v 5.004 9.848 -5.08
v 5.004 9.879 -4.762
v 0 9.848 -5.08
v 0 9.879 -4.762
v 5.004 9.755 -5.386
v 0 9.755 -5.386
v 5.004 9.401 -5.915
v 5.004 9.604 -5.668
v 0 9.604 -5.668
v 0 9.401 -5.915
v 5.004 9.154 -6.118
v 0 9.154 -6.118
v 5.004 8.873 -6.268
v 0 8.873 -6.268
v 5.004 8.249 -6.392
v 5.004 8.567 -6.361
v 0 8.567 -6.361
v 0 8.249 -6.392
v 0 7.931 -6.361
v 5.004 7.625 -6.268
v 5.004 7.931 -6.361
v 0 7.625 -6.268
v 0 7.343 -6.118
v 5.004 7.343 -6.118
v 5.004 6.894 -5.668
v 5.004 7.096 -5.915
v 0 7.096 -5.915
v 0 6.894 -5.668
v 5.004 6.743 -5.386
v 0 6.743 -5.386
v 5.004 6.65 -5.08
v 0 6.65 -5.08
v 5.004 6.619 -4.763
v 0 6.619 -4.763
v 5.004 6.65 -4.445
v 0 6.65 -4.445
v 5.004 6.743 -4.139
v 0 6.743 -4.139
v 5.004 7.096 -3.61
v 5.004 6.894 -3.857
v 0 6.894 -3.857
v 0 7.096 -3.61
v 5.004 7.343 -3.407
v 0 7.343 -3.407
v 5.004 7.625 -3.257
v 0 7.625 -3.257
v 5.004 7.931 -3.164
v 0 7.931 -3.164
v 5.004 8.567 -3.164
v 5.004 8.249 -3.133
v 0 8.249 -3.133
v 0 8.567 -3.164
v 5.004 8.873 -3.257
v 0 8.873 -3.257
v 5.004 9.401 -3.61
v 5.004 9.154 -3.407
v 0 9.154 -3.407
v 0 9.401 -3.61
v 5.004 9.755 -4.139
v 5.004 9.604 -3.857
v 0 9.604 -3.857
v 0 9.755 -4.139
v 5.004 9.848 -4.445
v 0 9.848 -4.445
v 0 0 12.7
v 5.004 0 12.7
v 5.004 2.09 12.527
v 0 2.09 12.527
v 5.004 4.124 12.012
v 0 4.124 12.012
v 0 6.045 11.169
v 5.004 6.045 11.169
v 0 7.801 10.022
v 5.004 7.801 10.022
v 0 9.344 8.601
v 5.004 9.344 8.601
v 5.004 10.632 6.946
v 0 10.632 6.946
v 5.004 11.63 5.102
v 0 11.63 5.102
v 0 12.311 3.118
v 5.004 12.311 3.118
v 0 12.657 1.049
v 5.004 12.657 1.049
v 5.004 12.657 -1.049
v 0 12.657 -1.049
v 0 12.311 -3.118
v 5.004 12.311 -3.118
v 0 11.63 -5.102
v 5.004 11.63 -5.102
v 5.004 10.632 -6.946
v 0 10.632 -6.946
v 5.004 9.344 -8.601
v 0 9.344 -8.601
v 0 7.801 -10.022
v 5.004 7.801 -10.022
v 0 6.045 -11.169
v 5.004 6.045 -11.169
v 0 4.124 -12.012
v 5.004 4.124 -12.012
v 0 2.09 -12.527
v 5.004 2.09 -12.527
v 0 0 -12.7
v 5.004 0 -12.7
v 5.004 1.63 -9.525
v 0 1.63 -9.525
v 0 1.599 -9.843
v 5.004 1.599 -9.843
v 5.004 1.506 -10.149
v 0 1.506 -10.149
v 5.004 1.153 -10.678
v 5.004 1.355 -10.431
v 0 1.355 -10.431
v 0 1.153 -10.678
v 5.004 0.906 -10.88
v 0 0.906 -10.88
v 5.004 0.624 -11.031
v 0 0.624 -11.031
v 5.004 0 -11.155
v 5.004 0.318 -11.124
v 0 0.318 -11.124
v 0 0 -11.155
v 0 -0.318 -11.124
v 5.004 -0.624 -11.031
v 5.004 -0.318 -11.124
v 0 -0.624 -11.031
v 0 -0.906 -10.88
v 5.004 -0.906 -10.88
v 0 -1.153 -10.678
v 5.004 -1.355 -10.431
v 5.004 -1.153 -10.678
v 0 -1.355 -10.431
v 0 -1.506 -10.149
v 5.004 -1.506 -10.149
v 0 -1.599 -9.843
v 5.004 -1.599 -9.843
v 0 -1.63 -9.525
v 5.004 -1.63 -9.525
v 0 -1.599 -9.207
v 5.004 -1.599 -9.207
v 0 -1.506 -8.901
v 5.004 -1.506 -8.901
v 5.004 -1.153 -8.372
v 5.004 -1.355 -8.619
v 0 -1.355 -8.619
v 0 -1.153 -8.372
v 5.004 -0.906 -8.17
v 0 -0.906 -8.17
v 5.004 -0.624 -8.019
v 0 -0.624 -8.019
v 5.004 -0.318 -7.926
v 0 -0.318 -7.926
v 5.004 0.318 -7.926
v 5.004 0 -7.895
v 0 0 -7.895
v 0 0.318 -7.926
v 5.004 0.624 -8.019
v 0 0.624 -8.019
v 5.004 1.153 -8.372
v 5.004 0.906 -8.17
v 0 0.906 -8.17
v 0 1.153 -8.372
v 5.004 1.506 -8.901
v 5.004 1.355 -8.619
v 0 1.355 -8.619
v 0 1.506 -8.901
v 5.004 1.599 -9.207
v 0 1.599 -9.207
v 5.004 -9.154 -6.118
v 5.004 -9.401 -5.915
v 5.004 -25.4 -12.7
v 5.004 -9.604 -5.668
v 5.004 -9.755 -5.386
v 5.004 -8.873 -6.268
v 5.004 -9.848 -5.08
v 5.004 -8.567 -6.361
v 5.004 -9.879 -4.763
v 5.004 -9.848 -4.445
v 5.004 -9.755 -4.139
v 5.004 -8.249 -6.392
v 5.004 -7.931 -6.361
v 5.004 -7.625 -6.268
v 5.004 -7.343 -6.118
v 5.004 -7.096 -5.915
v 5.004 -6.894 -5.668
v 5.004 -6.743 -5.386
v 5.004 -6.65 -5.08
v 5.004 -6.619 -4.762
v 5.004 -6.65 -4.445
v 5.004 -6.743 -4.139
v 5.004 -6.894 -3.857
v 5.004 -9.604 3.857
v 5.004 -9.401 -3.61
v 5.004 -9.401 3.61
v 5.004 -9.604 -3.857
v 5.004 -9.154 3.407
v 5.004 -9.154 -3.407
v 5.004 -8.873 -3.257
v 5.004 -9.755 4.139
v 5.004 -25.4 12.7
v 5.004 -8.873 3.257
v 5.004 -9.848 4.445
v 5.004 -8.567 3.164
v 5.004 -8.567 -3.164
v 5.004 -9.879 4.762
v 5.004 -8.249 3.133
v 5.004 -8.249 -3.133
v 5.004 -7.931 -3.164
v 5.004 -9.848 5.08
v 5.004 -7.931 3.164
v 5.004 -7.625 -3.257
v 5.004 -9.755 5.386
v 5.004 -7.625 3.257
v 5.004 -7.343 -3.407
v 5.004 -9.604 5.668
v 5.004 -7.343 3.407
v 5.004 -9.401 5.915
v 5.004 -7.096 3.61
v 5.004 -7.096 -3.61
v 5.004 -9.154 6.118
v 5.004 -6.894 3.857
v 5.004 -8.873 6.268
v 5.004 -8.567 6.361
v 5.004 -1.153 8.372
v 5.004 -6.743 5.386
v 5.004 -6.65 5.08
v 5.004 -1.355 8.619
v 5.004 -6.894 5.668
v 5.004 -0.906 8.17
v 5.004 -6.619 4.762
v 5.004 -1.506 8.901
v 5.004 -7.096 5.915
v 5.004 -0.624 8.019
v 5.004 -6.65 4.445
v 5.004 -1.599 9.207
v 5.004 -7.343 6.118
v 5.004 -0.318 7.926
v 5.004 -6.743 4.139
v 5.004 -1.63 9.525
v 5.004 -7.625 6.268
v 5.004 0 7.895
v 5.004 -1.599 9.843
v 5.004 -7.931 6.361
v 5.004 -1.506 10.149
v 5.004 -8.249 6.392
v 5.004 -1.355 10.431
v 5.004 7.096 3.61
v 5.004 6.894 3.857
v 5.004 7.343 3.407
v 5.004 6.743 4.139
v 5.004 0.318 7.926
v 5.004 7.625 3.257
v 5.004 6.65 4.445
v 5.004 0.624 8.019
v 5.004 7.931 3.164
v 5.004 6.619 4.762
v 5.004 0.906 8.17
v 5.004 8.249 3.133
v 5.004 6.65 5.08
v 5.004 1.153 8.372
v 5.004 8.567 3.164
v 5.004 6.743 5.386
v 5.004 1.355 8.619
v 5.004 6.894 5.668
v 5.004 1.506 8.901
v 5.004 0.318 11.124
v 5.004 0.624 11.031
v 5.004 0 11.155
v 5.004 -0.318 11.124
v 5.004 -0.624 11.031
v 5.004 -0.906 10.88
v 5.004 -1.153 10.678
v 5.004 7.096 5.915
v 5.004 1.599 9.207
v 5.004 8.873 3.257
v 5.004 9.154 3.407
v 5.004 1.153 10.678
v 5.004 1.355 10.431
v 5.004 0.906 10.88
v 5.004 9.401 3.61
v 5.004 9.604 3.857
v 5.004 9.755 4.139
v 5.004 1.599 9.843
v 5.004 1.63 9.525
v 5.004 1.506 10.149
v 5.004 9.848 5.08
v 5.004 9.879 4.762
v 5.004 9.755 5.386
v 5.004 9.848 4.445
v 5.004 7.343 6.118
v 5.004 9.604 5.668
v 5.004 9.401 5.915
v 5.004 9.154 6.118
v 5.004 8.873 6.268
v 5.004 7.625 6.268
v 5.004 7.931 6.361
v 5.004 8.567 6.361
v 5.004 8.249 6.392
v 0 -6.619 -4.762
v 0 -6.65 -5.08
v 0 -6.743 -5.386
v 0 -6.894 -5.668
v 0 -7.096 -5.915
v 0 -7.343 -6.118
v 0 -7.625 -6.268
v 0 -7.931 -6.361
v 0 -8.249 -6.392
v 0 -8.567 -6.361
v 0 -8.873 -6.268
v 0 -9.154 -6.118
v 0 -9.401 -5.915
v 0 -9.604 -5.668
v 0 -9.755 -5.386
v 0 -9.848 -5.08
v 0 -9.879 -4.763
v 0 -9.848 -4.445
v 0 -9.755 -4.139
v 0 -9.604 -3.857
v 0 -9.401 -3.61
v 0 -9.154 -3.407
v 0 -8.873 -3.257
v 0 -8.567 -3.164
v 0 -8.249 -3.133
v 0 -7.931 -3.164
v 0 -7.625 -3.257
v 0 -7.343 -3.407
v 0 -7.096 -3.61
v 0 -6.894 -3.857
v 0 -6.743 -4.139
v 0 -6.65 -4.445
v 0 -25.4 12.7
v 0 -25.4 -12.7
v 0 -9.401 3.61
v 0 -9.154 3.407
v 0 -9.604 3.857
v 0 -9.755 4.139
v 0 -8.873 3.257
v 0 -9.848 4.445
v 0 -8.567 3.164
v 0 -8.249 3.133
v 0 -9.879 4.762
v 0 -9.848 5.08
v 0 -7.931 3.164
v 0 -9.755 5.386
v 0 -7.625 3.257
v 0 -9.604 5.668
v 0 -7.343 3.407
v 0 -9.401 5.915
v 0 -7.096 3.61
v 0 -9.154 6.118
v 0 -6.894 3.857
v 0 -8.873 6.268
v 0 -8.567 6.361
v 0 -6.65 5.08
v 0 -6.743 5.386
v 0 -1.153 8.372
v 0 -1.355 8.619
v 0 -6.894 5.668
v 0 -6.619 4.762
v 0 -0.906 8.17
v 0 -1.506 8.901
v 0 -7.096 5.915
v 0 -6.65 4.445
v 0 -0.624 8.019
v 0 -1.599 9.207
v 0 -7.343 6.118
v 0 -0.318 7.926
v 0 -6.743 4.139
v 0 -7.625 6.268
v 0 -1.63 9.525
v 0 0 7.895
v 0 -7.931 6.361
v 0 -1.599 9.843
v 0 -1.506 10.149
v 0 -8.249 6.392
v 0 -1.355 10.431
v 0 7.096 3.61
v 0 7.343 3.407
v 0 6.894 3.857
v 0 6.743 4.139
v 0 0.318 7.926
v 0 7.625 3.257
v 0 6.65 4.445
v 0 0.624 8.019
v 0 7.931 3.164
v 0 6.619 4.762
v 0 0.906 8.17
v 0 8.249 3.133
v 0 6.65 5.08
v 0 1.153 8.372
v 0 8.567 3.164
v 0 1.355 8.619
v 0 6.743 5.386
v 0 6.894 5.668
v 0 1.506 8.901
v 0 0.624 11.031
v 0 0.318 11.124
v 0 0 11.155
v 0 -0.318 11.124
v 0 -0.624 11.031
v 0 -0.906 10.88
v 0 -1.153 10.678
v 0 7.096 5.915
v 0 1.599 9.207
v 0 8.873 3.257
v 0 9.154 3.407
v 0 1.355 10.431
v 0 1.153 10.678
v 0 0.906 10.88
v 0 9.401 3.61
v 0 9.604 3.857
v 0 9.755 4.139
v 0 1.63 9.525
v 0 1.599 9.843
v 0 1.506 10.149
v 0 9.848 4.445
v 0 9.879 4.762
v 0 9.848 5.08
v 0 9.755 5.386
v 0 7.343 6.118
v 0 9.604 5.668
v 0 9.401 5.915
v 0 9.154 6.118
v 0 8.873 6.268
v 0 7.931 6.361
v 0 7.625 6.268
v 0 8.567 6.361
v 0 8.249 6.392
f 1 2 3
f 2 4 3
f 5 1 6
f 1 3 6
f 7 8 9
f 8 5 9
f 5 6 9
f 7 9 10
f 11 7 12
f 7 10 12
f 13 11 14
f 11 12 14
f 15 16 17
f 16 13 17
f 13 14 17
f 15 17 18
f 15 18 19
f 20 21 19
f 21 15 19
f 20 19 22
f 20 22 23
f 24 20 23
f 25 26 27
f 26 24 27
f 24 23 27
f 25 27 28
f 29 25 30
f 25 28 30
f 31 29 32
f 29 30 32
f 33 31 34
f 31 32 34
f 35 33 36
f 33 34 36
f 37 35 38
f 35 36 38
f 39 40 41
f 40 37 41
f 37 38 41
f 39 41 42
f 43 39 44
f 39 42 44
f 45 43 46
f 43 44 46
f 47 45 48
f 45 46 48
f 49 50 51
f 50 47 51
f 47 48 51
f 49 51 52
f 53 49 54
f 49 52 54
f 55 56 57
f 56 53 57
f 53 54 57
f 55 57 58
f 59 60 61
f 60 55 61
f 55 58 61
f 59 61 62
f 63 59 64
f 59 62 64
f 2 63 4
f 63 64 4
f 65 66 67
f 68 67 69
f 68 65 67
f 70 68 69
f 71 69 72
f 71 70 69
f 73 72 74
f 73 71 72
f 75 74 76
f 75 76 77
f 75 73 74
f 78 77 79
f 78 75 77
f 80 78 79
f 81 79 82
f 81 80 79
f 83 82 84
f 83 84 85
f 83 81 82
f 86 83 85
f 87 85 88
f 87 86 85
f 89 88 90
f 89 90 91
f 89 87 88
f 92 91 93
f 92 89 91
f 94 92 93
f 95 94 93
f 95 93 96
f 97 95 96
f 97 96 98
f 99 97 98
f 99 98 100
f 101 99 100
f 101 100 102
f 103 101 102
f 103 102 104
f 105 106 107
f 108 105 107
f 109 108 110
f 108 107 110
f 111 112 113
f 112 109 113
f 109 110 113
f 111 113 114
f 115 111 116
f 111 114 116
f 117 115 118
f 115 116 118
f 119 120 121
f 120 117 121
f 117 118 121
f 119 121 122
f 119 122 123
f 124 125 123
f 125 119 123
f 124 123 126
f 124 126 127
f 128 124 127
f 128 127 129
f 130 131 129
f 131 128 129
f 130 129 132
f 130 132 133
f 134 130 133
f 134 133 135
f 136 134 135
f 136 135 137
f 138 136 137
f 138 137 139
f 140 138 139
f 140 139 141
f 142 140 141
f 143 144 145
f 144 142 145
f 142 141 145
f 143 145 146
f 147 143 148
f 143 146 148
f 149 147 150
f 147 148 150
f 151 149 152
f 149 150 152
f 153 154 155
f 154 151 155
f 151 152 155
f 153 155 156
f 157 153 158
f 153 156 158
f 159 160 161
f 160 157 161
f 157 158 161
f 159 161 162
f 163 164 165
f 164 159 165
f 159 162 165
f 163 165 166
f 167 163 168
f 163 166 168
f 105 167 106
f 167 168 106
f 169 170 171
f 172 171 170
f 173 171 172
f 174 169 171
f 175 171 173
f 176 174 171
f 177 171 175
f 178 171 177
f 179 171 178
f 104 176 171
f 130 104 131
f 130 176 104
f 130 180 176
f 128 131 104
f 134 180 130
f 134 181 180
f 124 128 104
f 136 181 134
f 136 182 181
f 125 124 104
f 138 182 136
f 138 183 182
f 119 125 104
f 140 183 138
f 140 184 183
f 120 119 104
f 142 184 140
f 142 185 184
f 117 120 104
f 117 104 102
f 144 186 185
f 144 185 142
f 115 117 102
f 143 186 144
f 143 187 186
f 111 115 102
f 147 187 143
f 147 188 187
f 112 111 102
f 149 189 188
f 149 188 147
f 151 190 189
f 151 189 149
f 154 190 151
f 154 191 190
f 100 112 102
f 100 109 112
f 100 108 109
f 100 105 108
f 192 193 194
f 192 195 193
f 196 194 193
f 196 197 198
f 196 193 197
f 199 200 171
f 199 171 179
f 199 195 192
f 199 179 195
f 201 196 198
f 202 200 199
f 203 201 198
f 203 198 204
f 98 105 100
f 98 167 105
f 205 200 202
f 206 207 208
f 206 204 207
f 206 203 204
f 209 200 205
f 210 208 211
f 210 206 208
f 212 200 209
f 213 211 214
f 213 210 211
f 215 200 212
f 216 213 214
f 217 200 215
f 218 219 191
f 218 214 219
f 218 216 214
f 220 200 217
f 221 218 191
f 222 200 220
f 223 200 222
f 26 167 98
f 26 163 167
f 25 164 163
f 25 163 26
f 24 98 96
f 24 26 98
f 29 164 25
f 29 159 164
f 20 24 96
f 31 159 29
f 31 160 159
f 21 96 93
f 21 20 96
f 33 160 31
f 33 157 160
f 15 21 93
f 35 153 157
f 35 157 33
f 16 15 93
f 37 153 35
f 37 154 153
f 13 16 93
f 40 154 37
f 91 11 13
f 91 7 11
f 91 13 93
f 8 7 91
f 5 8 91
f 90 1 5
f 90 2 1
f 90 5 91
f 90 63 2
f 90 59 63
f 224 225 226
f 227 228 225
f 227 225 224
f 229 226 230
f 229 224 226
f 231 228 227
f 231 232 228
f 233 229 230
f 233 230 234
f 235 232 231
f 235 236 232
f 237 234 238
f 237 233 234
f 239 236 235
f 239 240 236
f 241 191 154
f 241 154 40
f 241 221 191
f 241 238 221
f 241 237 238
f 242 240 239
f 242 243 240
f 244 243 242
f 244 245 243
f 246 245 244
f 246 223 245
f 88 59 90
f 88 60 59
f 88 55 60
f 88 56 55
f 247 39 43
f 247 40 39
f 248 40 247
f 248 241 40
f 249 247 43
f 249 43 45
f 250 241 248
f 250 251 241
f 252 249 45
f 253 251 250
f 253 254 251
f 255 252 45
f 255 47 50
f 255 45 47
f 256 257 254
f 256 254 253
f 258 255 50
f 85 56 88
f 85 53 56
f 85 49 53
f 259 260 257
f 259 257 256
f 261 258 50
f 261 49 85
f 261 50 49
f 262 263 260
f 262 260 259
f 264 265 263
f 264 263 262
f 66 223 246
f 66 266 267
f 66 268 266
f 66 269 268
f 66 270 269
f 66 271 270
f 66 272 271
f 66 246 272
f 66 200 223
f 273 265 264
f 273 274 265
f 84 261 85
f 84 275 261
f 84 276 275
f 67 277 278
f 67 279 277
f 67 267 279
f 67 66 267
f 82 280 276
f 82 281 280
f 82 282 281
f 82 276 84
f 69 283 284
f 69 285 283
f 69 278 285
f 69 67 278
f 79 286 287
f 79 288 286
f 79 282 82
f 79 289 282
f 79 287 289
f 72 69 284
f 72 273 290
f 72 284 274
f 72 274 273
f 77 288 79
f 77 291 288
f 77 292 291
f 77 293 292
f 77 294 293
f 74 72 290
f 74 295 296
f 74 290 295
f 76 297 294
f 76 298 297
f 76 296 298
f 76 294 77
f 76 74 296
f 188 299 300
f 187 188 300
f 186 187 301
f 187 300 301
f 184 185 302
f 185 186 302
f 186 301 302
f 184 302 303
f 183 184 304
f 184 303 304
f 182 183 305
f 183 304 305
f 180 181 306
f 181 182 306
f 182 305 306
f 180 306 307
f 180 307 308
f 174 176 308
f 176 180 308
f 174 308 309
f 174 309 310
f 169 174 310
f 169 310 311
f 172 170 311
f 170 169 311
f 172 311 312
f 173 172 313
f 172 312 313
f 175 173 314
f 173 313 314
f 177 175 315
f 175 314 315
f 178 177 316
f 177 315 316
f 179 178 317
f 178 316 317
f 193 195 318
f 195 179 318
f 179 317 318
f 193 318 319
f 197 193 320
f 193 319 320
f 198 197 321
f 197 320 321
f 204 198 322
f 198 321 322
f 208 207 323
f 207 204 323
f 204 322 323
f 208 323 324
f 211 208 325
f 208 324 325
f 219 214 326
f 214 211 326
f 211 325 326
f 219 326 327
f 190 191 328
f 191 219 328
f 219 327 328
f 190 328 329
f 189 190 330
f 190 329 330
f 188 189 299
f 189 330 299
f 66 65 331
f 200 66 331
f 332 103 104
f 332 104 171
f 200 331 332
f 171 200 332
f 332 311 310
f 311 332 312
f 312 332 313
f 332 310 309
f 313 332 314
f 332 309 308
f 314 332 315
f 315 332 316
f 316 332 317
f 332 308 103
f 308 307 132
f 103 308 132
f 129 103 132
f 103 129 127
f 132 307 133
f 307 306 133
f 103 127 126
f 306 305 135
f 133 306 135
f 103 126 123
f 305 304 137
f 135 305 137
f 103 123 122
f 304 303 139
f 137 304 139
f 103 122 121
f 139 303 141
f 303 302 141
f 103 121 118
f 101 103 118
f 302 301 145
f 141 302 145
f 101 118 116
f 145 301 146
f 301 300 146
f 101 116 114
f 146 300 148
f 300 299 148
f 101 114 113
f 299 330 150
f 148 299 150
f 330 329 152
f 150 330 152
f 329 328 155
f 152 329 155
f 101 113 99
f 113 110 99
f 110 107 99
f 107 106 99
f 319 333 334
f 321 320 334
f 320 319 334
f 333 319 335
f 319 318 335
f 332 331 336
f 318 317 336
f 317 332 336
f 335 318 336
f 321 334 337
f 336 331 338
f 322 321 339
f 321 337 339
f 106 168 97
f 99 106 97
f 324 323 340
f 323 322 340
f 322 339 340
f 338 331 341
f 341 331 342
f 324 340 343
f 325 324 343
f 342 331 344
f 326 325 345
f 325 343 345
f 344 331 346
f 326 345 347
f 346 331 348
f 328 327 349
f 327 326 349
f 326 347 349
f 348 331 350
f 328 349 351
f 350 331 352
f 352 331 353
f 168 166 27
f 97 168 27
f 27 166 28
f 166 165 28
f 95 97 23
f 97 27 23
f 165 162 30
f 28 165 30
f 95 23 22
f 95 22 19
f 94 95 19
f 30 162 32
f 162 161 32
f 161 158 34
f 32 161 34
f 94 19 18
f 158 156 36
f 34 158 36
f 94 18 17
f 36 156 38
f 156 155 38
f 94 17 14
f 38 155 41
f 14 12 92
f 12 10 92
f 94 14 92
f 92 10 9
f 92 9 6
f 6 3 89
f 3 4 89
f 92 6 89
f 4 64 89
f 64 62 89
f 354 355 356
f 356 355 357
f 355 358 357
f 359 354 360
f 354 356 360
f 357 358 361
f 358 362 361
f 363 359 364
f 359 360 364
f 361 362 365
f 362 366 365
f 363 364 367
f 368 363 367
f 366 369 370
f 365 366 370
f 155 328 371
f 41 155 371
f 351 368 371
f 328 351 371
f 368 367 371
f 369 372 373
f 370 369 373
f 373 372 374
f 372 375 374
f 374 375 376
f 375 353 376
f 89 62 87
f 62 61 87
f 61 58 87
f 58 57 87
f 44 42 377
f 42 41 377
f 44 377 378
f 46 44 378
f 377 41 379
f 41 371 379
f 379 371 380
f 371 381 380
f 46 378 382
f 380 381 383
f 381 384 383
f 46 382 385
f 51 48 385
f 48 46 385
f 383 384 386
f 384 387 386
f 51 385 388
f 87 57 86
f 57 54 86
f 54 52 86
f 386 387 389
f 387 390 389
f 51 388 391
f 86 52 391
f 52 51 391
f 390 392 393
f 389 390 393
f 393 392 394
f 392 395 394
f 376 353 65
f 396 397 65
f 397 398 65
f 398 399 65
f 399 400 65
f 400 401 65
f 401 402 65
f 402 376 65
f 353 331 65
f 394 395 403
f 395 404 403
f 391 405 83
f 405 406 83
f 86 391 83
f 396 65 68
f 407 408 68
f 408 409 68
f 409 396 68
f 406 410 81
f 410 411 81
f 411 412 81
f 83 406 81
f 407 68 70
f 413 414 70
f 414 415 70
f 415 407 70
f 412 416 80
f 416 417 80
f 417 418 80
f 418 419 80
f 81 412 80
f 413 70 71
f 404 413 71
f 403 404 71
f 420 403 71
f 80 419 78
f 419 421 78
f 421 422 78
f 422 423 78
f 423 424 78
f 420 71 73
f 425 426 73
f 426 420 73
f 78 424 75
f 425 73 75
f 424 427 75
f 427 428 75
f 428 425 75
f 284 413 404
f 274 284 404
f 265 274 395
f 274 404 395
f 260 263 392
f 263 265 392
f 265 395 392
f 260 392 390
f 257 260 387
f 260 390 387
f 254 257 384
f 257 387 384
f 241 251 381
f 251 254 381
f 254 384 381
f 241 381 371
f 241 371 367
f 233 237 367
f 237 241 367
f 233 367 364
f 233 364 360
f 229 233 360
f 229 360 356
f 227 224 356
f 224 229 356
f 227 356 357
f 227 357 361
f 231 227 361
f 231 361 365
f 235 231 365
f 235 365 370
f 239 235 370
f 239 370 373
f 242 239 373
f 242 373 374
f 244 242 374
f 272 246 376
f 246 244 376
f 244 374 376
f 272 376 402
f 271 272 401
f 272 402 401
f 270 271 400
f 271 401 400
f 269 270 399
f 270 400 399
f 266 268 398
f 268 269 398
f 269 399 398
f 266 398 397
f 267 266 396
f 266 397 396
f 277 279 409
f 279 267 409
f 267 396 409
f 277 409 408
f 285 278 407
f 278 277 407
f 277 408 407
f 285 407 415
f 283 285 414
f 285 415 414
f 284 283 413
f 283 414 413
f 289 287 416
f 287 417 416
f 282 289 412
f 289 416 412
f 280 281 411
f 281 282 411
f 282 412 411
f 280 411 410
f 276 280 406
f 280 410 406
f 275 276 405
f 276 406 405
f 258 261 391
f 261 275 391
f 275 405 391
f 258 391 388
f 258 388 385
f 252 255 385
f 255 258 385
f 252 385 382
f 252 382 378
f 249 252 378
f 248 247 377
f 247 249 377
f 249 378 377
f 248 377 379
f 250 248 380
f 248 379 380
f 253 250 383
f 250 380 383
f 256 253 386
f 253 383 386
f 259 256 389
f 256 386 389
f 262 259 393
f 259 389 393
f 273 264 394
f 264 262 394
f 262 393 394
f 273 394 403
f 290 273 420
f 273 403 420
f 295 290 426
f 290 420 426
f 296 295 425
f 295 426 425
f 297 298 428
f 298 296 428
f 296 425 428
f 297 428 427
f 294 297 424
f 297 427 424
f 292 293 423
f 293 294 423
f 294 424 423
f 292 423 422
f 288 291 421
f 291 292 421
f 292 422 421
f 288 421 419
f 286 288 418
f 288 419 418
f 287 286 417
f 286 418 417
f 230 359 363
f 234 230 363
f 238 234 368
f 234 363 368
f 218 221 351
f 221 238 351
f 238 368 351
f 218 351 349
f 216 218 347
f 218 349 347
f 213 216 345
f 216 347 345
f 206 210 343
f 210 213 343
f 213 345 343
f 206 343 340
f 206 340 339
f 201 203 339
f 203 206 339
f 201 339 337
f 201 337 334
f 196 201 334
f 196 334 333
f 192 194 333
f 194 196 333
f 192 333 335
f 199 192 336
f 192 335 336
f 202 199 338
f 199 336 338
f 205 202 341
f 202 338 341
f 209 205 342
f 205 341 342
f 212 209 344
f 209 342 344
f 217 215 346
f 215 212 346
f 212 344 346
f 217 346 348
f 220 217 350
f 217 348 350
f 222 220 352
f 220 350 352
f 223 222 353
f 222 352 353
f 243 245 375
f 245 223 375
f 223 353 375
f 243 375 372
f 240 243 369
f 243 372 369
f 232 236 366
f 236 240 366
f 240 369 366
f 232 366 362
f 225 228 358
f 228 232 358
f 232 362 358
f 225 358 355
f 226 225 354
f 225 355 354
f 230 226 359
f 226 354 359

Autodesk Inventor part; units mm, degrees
ref_plane "YZ Plane" through (0, 0, 0) normal (1, 0, 0) x (0, 1, 0)
sketch "Sketch1" plane through (0, 0, 0) normal (1, 0, 0) x (0, 1, 0)
  circle A0 centre (0, 0) radius 12.7
  circle A1 centre (0, 0) radius 6
  circle A2 centre (0, 9.525) radius 1.63
  circle A3 centre (8.2489, 4.7625) radius 1.63
  circle A4 centre (8.2489, -4.7625) radius 1.63
  circle A5 centre (0, -9.525) radius 1.63
  circle A6 centre (-8.2489, -4.7625) radius 1.63
  circle A7 centre (-8.2489, 4.7625) radius 1.63
  circle A8 centre (0, 0) radius 6
  circle A9 centre (0, 0) radius 3.2
  point P0 (0, 0.0001)
extrude "Extrusion1" add sketch "Sketch1" along normal blind 5.0038 contours A0 | A1 | A9
sketch "Sketch2" plane through (0, 0, 0) normal (-1, 0, 0) x (0, 0, 1)
  circle A0 centre (0, 0) radius 12.7 projected
  line L0 (12.7, 0) -> (12.7, -25.4)
  line L1 (0, 0) -> (0, -12.7) construction
  line L2 (-12.7, 0) -> (-12.7, -25.4)
  line L3 (12.7, -25.4) -> (-12.7, -25.4)
  circle A1 centre (-9.525, 0) radius 1.63 projected
  circle A2 centre (-4.7625, 8.2489) radius 1.63 projected
  circle A3 centre (4.7625, 8.2489) radius 1.63 projected
  circle A4 centre (4.7625, -8.2489) radius 1.63 projected
  circle A5 centre (-4.7625, -8.2489) radius 1.63 projected
  circle A6 centre (9.525, 0) radius 1.63 projected
  circle A7 centre (0, 0) radius 12.7 projected
  arc A8 (-12.7, 0) -> (12.7, 0) centre (0, 0) ccw
  dimension "d2" = 25.4
extrude "Extrusion2" add sketch "Sketch2" against normal blind 5.0038 contours L0 L3 L2 A0
ref_plane "Work Plane1" through (2.5019, 0, 0) normal (-1, 0, 0) x (0, 0, 1)
ref_plane "Work Plane2" through (0, -25.4, 0) normal (0, 0, -1) x (-1, 0, 0)
properties part number "thumb mount"
